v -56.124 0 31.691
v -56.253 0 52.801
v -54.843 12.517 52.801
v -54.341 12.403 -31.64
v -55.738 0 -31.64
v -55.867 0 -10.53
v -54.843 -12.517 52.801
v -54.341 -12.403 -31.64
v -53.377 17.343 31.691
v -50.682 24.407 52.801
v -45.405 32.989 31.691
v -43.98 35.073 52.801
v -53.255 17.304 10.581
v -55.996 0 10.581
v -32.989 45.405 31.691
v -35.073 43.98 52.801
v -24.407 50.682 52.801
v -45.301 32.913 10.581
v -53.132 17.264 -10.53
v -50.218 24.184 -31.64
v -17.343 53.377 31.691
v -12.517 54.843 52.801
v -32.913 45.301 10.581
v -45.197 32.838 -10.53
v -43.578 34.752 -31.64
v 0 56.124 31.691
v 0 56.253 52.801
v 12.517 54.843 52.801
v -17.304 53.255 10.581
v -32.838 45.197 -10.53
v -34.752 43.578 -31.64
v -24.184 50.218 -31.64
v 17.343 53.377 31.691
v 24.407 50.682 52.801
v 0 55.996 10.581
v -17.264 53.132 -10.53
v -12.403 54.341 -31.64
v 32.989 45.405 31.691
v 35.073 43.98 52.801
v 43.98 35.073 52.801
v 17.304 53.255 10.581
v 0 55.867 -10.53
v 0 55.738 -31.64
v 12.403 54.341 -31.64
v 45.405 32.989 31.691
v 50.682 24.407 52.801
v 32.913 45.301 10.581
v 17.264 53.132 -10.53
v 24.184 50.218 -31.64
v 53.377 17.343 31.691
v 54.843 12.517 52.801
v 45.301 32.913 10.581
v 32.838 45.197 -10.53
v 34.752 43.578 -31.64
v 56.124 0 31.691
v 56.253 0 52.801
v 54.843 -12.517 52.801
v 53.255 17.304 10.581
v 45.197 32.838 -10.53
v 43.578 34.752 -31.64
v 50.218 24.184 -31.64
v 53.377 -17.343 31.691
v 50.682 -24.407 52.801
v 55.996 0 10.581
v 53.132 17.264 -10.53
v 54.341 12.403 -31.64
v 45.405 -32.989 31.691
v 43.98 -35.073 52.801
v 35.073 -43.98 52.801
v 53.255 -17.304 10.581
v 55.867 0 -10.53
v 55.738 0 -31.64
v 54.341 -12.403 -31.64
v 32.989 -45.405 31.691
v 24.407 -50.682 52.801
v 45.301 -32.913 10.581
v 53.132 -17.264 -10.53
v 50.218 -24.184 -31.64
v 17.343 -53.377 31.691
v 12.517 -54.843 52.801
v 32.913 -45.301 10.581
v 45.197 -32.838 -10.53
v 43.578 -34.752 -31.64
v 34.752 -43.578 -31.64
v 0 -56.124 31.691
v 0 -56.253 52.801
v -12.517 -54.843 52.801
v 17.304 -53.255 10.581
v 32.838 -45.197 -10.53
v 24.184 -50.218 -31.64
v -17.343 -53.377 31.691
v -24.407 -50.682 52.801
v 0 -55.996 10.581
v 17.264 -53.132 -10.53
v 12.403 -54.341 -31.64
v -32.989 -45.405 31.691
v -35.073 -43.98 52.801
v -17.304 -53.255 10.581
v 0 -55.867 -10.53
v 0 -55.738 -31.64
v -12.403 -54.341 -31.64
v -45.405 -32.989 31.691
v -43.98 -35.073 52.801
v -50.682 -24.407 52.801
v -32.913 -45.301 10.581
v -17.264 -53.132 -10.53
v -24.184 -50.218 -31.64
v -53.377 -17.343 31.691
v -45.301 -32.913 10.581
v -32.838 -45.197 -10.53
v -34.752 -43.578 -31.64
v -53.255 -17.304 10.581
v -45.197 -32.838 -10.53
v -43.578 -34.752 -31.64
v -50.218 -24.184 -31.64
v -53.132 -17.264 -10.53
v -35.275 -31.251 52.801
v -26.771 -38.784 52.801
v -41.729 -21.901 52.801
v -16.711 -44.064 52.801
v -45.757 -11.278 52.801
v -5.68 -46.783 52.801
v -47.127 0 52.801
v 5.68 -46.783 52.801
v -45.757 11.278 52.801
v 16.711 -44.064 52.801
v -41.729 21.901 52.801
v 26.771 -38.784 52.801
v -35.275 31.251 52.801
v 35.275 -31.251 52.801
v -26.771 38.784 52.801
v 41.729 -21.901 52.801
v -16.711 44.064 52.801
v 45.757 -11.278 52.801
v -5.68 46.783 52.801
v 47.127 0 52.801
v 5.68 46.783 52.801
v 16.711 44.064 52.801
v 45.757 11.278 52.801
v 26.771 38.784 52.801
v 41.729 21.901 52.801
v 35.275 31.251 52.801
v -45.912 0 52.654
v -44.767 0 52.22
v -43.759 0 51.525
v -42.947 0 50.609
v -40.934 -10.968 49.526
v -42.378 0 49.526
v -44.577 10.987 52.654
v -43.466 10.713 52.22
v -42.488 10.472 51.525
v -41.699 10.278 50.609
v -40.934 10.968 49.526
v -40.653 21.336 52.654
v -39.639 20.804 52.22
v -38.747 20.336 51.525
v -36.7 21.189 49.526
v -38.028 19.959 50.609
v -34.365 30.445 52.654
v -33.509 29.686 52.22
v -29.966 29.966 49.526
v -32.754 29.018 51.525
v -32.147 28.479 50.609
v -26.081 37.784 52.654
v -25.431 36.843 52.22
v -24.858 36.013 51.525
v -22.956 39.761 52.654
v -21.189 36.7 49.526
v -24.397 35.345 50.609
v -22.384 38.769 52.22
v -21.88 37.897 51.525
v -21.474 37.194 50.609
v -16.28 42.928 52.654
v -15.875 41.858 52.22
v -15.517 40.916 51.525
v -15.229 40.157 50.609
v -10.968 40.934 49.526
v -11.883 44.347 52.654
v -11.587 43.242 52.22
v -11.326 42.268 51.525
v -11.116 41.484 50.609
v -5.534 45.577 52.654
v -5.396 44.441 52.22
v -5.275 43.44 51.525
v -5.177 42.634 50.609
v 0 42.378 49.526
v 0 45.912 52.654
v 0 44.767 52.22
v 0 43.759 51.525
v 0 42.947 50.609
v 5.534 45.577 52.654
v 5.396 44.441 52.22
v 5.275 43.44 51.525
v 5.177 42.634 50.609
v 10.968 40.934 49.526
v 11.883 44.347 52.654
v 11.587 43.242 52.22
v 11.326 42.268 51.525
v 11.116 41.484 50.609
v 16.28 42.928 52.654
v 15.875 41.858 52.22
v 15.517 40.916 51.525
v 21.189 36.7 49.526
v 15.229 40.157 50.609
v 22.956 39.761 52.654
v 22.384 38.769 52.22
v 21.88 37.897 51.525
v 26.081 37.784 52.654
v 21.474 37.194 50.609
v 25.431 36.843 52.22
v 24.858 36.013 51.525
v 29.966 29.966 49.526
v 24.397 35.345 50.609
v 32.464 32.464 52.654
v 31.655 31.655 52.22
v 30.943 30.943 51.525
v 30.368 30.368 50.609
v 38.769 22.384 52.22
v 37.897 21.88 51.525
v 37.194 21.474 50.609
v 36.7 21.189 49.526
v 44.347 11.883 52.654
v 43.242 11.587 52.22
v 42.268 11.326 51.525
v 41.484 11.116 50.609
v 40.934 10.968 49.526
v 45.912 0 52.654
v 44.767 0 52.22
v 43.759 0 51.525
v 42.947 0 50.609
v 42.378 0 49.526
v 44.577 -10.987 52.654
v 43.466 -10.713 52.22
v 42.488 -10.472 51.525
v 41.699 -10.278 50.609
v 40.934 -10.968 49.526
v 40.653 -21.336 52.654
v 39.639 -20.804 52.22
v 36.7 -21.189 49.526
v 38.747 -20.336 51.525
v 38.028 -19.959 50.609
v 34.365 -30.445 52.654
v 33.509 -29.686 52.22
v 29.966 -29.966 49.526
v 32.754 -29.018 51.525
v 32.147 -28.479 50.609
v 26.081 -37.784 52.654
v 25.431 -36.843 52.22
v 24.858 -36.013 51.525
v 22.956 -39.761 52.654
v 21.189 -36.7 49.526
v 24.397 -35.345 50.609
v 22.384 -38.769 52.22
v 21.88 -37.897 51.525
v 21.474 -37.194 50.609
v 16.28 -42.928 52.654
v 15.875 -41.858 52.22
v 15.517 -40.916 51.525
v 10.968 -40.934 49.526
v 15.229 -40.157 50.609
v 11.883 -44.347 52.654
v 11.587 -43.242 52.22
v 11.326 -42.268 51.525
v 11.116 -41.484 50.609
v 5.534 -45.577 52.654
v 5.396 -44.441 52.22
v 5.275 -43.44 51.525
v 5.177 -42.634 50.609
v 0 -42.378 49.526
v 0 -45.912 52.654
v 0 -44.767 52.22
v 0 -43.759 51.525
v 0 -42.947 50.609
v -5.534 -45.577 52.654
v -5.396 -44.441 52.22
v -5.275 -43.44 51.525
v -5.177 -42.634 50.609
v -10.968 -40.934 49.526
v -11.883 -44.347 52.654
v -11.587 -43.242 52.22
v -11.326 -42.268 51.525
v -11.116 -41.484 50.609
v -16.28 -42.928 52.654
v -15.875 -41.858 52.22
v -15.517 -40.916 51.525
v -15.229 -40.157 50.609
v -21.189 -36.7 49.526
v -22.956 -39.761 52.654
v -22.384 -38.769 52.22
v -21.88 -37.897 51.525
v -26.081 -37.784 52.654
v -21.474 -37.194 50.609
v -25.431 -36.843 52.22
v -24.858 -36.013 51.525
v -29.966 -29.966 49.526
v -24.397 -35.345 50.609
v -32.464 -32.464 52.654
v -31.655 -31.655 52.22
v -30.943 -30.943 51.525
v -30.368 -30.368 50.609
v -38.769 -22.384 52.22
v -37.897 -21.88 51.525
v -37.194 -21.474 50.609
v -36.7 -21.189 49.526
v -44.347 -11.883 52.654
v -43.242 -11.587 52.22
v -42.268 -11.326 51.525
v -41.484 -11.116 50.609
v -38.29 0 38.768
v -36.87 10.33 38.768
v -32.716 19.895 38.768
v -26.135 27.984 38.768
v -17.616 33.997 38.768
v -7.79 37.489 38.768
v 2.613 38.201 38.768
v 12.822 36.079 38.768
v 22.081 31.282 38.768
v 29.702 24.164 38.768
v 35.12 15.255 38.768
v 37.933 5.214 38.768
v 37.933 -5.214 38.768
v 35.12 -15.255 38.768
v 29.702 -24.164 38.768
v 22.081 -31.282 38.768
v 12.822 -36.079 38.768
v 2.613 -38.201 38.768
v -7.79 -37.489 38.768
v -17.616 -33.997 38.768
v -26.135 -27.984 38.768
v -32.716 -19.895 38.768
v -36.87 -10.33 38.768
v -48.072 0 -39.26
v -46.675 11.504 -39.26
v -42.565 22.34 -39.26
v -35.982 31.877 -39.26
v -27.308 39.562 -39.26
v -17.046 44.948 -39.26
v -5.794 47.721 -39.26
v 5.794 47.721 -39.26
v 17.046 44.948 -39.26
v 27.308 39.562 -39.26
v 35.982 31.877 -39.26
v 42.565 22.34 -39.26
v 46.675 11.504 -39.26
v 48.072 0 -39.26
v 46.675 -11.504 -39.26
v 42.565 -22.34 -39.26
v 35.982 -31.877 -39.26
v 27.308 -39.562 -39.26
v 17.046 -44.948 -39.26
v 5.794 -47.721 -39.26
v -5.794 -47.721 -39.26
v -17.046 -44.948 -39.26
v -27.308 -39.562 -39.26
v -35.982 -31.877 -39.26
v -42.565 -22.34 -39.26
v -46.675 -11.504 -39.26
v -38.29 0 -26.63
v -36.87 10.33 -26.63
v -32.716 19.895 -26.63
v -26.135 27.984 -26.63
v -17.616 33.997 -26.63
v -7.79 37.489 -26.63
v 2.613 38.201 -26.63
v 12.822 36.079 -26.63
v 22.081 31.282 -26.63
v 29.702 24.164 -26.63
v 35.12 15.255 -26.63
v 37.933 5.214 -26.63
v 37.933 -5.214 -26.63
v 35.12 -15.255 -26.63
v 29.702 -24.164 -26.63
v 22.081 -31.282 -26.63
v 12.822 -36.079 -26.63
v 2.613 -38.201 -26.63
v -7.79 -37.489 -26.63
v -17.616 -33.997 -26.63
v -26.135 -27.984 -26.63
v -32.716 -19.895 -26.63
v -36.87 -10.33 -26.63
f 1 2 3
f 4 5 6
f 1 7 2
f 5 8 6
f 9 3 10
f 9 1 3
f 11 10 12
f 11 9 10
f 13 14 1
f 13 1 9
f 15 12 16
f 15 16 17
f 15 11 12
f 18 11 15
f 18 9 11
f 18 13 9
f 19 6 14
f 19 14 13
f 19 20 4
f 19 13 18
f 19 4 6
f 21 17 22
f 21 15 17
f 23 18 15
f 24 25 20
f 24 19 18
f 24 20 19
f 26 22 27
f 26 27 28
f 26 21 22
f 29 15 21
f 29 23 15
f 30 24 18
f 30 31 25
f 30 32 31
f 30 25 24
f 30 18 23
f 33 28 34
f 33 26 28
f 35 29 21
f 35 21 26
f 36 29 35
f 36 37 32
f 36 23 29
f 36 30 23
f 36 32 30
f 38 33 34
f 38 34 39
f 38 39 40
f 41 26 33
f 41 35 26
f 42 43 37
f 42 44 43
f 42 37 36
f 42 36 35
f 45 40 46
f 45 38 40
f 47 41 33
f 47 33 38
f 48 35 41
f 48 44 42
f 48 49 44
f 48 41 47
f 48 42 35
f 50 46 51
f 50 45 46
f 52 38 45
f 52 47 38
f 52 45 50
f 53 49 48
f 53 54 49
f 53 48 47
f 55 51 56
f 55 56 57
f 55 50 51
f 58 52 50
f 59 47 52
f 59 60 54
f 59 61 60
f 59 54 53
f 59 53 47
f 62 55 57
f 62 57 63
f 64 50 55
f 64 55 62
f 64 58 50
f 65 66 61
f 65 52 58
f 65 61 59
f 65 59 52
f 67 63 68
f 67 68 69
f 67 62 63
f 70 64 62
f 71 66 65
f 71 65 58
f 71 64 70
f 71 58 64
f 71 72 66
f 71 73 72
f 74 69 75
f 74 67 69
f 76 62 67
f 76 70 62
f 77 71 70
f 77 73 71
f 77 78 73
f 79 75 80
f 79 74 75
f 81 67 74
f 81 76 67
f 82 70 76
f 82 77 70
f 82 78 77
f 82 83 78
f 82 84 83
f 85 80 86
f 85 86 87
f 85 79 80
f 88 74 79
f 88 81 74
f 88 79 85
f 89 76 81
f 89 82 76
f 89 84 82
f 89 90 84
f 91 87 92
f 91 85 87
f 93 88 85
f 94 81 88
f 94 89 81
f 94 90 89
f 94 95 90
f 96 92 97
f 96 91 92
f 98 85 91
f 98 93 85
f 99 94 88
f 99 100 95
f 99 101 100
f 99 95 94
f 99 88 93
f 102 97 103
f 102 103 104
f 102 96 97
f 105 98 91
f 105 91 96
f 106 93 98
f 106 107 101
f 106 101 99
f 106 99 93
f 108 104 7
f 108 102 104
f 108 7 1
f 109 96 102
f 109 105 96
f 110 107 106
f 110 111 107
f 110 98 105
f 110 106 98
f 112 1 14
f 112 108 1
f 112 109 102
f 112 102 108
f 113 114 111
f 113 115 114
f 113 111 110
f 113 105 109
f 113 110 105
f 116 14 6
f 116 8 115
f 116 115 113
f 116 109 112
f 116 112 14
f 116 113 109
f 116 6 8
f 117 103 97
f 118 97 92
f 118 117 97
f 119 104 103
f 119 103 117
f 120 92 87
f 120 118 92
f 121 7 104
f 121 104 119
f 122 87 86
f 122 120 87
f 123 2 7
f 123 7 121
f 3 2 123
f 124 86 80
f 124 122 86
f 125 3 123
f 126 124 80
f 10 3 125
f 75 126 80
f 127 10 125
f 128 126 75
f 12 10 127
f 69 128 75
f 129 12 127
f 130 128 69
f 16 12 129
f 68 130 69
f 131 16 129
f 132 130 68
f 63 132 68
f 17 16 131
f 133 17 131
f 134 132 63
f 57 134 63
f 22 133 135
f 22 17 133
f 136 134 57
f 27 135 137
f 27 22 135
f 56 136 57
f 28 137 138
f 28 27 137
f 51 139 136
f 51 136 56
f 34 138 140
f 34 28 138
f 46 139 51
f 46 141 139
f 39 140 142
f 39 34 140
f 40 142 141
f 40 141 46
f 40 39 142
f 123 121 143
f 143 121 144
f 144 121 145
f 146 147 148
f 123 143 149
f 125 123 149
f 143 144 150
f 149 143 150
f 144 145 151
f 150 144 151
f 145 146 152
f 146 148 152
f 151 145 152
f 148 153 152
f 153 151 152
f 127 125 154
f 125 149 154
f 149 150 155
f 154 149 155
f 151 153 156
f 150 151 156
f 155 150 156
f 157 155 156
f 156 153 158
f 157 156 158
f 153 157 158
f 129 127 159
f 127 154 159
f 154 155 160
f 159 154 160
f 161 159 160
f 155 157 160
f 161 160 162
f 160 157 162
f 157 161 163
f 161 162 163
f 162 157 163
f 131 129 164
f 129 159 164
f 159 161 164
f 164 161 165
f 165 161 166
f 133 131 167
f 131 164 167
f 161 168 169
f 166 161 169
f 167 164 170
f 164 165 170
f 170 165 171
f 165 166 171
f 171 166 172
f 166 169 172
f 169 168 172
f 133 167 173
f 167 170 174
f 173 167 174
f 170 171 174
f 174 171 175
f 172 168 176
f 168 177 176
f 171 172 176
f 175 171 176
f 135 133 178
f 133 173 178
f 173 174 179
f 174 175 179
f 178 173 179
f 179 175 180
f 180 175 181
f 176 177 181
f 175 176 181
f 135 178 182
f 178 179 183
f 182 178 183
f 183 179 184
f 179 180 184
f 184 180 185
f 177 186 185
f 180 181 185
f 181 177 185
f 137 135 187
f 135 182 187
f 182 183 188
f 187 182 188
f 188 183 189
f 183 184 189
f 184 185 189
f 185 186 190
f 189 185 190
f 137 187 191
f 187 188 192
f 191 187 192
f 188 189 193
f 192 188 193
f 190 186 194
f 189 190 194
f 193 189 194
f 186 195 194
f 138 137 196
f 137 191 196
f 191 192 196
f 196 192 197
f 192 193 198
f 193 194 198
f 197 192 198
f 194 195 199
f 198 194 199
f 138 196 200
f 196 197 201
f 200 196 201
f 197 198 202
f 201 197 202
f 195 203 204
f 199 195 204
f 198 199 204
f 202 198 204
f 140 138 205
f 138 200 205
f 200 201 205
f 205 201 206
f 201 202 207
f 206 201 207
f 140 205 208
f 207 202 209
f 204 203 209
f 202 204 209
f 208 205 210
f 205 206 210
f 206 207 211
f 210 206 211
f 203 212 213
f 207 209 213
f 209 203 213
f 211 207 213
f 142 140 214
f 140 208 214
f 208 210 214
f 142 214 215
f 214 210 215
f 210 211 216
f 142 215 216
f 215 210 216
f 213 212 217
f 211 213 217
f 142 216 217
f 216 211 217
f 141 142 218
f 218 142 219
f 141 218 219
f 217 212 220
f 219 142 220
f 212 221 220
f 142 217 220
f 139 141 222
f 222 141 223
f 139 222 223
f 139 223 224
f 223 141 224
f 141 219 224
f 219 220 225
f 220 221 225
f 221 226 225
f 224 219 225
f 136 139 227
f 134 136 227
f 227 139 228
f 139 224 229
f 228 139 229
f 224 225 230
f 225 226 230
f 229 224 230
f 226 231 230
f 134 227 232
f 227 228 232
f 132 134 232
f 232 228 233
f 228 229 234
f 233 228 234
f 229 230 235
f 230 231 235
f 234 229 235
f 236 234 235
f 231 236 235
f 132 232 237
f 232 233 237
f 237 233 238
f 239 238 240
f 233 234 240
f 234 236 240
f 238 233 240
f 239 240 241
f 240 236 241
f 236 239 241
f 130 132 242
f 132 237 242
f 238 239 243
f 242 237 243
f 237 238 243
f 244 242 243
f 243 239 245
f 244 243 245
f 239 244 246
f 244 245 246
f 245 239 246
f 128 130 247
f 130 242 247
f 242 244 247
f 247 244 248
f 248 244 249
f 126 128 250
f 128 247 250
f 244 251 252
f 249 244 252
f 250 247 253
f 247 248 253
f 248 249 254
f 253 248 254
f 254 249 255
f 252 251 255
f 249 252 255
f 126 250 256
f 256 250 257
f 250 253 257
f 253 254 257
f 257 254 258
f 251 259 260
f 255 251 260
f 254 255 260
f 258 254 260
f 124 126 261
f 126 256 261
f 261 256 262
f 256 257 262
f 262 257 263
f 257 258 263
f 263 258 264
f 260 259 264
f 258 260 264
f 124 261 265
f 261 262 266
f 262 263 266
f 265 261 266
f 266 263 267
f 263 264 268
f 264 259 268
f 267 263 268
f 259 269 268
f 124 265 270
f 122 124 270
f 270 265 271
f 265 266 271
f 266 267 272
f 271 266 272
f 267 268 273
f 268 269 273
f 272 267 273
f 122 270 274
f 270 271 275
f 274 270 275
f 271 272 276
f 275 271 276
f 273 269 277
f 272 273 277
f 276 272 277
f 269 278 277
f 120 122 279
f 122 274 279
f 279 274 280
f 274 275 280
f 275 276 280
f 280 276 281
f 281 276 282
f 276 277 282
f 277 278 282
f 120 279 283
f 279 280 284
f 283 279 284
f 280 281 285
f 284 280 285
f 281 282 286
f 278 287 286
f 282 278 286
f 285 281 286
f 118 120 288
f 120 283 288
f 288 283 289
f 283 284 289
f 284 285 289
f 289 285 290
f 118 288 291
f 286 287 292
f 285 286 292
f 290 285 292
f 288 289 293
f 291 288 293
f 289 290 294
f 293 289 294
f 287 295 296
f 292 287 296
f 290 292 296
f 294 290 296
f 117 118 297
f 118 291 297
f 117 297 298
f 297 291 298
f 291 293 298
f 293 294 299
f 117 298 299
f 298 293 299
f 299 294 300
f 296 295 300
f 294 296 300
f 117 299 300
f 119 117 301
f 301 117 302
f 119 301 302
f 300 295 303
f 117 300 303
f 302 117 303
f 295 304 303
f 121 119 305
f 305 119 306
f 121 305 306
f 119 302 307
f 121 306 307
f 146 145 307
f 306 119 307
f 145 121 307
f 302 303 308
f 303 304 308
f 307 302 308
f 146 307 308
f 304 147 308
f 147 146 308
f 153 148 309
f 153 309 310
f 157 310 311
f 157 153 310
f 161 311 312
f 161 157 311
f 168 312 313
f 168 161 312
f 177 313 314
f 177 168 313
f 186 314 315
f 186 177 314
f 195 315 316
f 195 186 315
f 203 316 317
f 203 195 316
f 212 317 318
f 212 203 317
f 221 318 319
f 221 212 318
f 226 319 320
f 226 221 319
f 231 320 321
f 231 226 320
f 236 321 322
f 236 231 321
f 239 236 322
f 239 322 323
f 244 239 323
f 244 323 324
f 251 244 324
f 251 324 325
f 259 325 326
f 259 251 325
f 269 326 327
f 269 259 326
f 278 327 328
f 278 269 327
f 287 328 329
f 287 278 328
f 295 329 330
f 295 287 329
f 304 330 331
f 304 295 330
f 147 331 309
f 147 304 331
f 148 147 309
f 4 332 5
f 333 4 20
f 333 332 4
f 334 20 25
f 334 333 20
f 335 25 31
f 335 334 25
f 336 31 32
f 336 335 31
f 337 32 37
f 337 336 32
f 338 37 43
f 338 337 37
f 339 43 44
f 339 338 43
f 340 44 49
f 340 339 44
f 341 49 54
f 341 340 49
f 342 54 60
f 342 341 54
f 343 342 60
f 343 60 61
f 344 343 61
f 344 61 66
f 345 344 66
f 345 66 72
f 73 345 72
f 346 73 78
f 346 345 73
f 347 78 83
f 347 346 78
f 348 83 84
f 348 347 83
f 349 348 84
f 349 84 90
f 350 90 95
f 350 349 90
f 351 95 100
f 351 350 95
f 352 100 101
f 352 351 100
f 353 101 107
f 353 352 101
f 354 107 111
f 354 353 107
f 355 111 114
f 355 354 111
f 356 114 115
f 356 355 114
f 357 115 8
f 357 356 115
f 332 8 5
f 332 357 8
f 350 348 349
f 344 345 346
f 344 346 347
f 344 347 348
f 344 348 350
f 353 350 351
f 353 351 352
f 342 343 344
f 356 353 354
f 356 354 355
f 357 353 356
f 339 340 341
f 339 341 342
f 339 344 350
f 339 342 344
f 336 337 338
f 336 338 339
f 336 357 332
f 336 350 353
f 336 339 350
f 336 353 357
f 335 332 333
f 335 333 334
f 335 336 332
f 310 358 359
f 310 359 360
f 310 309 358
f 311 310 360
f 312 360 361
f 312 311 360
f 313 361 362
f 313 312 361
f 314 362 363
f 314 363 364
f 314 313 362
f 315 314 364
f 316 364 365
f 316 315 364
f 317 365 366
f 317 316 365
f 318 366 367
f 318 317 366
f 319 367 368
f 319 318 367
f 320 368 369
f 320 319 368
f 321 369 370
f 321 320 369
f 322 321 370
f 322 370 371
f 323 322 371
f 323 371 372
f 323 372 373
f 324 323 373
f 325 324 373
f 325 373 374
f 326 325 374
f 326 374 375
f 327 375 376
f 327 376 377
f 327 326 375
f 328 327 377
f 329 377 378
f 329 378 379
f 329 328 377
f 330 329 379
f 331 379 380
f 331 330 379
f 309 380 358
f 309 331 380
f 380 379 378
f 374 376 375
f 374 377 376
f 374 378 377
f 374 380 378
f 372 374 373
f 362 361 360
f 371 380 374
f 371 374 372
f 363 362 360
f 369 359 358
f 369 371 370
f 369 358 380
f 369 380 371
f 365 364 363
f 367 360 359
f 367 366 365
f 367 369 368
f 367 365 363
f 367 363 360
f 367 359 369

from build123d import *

# Parameters (mm, degrees)
F2_R    = 5.08
F3_SIZE = 7.62


with BuildPart() as f1:
    # F0 (on Front) → F1 (revolve)
    with BuildSketch(Plane.XZ):
        Polygon((-43.622624, 52.801218), (-56.252953, 52.801218), (-55.691604, -39.259836), (0, -39.259836), (0, -26.629508), (-38.289819, -26.629508), (-38.289819, 38.767517), align=None)
    revolve(axis=Axis((0, 0, -32.944672), (0, 0, -1)))

    # F2
    f2_edges = [f1.edges().sort_by_distance(p)[0] for p in [
        (43.622624, 0, 52.801218),
    ]]
    fillet(f2_edges, radius=F2_R)

    # F3
    f3_edges = [f1.edges().sort_by_distance(p)[0] for p in [
        (55.691604, 0, -39.259836),
    ]]
    chamfer(f3_edges, length=F3_SIZE)


solid = f1.part
